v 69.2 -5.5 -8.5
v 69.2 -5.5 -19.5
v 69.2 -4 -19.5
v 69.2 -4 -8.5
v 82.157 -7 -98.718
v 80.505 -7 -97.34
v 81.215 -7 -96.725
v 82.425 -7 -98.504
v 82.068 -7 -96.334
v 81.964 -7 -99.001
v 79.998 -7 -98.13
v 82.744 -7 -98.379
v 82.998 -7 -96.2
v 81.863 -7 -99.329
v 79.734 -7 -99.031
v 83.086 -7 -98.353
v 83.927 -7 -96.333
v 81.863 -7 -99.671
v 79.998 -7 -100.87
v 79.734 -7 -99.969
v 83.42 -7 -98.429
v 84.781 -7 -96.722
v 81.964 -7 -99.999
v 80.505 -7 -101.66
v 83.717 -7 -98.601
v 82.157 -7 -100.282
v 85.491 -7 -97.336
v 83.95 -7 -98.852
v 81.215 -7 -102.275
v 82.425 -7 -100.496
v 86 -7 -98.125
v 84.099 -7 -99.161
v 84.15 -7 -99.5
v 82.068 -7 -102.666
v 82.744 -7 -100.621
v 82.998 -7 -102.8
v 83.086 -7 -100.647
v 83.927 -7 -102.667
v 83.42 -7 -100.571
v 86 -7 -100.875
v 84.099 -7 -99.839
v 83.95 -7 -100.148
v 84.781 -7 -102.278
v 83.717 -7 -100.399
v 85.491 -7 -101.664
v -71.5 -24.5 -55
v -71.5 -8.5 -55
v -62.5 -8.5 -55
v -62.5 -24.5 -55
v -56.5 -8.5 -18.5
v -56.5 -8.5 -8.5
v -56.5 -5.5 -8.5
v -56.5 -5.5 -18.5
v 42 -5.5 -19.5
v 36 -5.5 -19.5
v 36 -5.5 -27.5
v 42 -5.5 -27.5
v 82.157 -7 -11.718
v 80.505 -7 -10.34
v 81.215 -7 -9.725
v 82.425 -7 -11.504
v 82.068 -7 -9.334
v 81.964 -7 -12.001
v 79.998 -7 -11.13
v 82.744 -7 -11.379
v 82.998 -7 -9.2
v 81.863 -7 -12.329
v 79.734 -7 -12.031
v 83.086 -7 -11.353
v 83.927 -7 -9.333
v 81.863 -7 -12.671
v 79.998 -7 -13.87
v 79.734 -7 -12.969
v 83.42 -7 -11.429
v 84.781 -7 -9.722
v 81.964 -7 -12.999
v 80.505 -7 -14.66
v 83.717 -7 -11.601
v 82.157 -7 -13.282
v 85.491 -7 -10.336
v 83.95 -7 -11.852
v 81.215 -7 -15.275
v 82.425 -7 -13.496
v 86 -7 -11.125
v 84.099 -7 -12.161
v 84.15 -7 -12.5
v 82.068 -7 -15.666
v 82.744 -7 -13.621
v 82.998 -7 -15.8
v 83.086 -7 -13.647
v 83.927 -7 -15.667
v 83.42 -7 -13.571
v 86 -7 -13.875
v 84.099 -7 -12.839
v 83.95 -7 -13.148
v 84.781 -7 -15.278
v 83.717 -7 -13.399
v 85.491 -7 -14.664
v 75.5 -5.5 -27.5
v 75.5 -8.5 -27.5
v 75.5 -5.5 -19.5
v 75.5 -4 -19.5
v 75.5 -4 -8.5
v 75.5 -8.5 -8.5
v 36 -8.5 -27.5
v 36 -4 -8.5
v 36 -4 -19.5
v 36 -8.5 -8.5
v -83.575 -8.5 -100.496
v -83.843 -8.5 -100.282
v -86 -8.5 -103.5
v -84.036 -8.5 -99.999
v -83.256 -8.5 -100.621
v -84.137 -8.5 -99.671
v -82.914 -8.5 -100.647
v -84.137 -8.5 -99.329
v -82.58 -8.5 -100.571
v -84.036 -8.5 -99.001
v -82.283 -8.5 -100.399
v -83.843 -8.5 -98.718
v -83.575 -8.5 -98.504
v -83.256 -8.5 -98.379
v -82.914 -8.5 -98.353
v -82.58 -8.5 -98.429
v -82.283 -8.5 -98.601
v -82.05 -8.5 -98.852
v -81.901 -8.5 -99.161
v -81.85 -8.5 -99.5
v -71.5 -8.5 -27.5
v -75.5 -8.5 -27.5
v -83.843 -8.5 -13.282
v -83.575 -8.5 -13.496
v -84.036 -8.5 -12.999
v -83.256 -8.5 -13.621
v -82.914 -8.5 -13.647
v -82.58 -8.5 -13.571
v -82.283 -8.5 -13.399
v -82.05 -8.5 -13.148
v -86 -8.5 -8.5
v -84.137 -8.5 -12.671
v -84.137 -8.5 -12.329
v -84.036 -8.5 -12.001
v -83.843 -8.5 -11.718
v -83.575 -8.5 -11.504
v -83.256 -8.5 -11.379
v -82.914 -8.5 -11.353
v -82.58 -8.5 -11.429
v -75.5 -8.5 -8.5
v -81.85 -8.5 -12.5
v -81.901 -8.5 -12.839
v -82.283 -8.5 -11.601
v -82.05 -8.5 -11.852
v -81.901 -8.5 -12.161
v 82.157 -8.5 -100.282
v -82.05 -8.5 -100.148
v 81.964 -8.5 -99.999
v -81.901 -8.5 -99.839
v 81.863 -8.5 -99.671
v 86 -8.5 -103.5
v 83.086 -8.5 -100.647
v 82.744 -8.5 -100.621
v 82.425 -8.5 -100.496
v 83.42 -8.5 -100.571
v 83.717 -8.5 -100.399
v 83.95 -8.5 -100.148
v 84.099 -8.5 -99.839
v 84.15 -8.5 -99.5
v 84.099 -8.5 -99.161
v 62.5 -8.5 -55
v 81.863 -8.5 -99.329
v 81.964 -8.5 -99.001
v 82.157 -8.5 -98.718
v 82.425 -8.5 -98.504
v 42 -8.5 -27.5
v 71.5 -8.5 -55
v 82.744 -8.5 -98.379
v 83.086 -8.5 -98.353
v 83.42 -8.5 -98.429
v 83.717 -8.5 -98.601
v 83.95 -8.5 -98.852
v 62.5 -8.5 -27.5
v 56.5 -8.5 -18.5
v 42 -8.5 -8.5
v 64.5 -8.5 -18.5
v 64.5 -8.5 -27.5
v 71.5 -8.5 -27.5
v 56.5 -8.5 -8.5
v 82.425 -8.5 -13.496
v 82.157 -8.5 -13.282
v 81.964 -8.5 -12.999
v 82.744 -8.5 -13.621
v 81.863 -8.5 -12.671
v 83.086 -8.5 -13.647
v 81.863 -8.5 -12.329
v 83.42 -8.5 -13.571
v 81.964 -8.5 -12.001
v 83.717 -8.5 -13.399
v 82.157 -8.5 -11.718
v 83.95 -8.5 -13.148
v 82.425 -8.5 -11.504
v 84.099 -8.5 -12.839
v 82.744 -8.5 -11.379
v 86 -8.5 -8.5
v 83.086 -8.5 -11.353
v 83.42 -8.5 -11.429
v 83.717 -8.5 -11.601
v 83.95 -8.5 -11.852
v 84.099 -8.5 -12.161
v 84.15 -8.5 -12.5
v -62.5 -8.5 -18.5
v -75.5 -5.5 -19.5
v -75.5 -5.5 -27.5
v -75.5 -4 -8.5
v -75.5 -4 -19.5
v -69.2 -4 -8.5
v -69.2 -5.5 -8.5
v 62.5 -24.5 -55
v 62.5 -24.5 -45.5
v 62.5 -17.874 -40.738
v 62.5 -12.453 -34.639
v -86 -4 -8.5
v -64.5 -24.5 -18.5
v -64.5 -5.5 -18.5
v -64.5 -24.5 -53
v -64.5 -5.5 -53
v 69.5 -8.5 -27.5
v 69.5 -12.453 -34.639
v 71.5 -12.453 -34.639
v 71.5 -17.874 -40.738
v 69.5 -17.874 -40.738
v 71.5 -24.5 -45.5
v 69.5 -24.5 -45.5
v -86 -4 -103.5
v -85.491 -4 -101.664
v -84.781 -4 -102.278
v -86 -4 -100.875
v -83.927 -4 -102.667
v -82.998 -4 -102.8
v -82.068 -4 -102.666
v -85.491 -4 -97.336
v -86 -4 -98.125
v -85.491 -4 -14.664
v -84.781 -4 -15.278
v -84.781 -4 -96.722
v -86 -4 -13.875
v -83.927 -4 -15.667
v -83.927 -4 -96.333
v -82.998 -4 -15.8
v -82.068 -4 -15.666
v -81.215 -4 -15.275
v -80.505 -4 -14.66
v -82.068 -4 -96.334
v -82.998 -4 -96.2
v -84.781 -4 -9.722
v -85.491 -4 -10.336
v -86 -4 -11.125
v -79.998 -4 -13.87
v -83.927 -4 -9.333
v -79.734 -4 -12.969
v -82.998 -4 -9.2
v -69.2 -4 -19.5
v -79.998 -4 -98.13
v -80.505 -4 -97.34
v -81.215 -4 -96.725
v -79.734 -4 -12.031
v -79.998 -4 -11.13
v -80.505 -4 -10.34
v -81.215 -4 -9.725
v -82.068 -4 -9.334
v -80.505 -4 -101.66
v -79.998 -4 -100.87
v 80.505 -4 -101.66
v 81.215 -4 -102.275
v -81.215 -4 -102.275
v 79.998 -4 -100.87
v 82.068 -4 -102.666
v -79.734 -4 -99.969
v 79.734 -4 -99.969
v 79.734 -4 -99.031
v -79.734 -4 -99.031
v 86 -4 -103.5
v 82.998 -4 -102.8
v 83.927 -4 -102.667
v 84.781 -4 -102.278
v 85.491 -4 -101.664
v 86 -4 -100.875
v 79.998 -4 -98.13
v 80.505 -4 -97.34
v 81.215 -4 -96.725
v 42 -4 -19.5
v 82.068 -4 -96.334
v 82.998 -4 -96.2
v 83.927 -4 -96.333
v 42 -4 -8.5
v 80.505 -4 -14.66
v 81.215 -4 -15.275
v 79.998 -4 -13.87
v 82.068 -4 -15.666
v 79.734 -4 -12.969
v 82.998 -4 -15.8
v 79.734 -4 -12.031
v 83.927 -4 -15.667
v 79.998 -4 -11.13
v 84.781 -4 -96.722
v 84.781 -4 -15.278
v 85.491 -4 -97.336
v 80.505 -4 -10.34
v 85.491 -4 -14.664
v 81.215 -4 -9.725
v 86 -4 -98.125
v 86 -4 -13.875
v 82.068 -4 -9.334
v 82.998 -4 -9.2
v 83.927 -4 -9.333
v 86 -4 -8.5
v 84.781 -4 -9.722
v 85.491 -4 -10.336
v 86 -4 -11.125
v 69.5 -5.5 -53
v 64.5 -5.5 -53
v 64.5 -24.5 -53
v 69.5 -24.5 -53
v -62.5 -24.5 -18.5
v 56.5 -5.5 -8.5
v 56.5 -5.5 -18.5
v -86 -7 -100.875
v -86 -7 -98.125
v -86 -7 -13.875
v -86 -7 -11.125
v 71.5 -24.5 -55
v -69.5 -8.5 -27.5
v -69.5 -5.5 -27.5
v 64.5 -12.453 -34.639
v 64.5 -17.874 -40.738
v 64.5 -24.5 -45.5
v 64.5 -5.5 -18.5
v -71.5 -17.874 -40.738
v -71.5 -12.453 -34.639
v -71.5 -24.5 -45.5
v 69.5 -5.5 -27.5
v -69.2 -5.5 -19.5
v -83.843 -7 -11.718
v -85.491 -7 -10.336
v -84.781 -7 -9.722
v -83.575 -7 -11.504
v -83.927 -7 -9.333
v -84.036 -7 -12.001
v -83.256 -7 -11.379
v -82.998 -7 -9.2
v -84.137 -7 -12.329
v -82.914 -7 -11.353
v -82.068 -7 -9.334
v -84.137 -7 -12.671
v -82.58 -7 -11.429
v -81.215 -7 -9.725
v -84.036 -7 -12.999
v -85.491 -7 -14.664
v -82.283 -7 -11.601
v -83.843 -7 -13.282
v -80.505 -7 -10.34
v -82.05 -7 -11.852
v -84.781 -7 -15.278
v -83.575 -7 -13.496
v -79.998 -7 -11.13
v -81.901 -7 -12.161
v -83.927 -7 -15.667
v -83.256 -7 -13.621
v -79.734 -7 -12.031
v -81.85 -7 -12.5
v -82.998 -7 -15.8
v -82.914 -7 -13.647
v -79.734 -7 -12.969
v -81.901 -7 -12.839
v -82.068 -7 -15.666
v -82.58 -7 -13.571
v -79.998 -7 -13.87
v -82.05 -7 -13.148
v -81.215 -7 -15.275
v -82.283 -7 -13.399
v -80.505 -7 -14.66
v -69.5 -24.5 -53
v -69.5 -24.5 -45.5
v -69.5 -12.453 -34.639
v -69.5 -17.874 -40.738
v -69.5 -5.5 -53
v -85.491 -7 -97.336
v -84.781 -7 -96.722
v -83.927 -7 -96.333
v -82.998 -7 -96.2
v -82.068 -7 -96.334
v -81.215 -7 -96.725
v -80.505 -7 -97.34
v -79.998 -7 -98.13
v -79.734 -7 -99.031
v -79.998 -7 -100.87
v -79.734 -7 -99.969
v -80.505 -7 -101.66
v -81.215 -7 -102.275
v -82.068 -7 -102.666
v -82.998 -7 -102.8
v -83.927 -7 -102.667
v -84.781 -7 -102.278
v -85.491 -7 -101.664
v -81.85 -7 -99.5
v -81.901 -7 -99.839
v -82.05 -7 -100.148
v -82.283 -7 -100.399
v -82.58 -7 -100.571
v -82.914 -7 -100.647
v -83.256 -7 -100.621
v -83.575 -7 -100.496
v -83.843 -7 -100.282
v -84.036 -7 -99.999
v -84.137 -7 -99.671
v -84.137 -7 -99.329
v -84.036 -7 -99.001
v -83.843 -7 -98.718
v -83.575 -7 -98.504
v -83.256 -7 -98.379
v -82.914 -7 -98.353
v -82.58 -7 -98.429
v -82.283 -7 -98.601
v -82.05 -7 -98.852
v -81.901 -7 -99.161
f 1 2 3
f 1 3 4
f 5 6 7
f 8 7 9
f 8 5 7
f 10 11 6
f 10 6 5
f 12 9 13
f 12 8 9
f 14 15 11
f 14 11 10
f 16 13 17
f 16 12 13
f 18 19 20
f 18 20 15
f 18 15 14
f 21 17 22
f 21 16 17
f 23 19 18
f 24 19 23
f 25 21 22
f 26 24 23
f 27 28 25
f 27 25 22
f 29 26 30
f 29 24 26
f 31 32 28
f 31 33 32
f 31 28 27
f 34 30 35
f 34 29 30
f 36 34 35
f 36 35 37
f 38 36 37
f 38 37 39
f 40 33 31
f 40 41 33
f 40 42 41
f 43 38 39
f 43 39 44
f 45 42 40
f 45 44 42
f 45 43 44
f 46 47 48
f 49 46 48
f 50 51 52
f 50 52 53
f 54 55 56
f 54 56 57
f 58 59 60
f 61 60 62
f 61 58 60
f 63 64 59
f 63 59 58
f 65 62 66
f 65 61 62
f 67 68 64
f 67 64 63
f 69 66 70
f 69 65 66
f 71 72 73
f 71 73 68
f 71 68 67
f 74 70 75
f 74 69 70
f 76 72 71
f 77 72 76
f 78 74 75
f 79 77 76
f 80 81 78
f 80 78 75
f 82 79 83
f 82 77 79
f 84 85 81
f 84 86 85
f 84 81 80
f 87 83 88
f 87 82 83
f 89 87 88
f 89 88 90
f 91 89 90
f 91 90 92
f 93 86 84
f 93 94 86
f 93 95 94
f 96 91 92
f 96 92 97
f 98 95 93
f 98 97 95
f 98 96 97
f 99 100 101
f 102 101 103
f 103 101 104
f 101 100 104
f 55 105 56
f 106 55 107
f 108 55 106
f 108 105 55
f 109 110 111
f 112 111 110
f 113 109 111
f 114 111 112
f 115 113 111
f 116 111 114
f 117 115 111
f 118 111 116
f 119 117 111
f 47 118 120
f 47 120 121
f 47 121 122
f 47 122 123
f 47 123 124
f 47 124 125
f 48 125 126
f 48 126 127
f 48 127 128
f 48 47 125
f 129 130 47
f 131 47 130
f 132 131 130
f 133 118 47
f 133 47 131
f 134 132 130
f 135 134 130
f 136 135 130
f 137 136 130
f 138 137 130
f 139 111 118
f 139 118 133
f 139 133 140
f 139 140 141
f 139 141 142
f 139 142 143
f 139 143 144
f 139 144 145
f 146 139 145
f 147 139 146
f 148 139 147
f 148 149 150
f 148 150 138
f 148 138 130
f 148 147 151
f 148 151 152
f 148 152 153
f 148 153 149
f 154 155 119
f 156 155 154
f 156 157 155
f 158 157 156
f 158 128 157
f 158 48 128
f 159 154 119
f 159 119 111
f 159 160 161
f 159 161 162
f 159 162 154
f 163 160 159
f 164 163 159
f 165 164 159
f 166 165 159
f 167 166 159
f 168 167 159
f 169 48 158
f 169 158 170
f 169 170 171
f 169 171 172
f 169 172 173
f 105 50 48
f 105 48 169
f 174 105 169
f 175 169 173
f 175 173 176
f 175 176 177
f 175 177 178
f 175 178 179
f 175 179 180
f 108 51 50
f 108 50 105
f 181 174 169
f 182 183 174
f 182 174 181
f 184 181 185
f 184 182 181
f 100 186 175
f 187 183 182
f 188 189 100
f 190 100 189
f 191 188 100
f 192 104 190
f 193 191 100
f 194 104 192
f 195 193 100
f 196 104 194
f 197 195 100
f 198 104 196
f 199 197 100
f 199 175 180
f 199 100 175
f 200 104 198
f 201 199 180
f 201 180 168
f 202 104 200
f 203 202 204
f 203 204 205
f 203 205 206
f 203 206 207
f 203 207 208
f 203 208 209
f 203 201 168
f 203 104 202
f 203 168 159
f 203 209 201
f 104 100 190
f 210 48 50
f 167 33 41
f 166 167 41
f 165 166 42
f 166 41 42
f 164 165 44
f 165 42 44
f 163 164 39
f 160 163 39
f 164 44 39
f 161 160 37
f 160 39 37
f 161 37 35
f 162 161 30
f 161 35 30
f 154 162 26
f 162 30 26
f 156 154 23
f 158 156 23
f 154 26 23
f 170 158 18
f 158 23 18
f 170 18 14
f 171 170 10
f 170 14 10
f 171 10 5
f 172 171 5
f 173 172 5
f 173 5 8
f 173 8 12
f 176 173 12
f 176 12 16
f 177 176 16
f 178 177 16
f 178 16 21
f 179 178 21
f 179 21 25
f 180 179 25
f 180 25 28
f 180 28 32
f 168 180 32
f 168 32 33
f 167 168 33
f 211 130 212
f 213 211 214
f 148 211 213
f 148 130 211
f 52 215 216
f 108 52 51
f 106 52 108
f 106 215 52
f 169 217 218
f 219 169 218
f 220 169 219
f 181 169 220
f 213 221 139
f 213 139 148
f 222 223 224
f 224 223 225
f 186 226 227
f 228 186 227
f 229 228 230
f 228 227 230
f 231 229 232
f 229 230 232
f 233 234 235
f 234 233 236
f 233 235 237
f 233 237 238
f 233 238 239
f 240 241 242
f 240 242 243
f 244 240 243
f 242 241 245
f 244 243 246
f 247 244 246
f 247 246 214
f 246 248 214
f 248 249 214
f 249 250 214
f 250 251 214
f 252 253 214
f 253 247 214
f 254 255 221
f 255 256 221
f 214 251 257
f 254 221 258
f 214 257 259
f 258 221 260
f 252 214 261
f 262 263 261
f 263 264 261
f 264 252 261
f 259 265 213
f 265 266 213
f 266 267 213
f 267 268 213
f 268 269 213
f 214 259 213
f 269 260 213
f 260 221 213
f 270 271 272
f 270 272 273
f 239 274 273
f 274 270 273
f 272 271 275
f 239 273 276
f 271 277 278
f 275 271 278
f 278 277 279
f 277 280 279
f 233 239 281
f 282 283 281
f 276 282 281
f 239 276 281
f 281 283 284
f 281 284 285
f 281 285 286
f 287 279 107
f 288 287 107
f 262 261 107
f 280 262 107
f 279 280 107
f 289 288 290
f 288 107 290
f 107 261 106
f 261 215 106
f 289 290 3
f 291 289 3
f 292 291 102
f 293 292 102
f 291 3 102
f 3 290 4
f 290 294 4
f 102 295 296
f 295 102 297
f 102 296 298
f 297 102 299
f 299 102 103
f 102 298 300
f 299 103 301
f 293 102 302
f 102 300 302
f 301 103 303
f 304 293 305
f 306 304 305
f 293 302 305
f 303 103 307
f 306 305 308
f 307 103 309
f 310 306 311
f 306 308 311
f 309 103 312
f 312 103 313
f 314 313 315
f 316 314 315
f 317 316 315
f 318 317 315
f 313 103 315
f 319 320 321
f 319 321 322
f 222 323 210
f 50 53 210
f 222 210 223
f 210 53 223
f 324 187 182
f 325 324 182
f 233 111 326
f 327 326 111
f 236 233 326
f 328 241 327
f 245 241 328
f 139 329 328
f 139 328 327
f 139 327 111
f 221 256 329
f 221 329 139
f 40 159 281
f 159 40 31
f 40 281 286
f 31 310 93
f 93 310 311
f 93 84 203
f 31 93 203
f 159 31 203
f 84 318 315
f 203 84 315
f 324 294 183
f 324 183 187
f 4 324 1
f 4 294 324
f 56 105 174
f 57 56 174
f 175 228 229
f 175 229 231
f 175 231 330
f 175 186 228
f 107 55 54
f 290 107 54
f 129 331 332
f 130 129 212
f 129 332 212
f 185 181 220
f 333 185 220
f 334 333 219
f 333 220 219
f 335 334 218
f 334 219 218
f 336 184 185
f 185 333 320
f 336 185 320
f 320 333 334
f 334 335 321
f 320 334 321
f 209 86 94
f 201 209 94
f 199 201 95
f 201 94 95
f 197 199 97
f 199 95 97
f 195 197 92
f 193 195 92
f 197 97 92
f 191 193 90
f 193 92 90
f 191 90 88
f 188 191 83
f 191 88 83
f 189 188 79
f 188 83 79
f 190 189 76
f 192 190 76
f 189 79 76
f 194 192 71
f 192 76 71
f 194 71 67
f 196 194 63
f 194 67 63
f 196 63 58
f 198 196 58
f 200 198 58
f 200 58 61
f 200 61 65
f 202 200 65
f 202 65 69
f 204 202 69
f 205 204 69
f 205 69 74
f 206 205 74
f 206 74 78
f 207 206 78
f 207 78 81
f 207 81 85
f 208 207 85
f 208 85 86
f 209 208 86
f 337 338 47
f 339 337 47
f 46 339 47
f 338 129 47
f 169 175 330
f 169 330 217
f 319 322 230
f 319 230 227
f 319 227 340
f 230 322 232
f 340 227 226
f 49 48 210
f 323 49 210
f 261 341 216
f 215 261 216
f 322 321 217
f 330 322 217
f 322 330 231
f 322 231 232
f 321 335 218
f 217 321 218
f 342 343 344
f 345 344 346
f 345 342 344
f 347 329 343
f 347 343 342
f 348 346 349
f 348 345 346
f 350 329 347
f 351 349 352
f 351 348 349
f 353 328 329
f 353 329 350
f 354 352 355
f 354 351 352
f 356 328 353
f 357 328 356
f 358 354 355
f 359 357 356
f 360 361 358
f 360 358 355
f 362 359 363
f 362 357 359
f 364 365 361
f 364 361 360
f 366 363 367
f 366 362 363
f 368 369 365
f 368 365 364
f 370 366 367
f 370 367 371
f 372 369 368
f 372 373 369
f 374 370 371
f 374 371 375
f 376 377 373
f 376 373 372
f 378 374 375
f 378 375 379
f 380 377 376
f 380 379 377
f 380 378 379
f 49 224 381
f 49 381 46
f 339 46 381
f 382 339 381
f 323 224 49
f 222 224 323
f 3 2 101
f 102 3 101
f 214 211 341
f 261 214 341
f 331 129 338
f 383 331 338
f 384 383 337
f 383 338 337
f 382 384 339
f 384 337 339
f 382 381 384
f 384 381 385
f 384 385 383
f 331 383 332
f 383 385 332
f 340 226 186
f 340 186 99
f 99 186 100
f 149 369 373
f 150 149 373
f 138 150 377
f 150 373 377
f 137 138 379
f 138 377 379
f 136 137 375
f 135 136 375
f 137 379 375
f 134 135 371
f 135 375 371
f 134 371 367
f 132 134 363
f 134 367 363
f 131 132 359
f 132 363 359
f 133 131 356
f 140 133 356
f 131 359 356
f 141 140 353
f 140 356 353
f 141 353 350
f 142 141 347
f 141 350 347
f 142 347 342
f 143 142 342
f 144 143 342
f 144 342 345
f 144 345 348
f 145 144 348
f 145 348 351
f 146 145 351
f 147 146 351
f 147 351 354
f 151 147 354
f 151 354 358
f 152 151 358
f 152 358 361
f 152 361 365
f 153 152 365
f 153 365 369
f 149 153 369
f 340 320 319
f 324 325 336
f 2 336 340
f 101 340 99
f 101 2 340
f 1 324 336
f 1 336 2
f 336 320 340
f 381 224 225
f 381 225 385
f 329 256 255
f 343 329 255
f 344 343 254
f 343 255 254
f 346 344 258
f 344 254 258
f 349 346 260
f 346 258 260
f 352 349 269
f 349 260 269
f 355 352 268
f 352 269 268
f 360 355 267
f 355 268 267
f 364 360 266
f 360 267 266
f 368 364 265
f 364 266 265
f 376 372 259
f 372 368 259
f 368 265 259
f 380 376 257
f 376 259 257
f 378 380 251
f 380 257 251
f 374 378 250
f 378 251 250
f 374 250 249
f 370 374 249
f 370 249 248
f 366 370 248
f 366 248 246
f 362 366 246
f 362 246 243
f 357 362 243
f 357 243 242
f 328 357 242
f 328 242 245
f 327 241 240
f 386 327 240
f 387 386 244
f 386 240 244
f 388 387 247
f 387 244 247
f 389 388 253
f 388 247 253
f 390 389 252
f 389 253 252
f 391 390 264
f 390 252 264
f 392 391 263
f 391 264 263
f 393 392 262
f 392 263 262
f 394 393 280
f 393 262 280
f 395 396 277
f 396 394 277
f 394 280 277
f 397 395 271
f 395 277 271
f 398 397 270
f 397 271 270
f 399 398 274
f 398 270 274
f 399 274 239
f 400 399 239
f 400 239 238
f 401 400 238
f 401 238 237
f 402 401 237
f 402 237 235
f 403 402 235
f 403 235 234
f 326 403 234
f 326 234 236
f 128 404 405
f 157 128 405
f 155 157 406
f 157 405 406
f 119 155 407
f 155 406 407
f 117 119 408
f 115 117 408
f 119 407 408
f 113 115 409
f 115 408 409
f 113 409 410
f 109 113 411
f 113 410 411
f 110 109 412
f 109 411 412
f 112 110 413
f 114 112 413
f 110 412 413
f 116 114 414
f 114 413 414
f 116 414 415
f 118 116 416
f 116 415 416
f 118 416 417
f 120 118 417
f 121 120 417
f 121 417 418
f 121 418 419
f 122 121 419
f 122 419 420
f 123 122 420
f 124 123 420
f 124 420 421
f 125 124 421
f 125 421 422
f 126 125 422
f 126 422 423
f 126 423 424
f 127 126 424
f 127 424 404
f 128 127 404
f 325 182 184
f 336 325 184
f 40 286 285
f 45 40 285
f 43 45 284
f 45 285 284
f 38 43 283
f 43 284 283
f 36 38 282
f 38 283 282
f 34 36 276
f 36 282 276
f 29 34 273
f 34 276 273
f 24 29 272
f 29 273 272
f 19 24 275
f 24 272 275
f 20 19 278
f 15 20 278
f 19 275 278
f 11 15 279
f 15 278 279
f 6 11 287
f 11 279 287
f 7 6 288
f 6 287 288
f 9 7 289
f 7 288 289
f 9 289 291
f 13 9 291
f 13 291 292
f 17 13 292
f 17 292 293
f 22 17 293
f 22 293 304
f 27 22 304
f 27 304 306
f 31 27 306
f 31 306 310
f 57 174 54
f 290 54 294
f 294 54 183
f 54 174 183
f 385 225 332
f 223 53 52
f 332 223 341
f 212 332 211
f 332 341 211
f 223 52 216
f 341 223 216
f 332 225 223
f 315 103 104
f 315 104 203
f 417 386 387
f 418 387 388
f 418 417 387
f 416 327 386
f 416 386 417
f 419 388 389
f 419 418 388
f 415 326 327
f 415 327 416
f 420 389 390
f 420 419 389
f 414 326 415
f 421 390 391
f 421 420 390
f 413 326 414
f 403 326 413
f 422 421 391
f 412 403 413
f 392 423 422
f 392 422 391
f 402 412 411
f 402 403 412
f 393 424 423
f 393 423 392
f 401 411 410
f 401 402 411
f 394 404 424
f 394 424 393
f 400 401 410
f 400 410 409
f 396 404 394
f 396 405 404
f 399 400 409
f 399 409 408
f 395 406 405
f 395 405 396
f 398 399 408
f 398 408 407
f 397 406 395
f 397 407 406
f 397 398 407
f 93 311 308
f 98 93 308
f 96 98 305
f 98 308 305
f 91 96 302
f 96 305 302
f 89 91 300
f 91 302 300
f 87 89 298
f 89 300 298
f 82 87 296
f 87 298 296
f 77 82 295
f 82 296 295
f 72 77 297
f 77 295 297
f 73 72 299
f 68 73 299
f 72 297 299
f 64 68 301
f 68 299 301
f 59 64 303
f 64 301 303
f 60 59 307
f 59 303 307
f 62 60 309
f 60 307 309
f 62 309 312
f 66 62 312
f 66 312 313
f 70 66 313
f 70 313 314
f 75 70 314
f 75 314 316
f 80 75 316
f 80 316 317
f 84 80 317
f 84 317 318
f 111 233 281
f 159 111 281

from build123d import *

# Parameters (mm, degrees)
SKETCH097_W     = 172
SKETCH097_H     = 95
PAD059_DEPTH    = 4.5
SKETCH098_W     = 6
SKETCH098_H     = 19
POCKET036_DEPTH = 3
SKETCH099_W     = 6.3
SKETCH099_H     = 11
SKETCH099_W_2   = 6
POCKET037_DEPTH = 5
PAD060_DEPTH    = 16
POCKET038_DEPTH = 5
POCKET039_DEPTH = 9
SKETCH103_R     = 1.15
POCKET040_DEPTH = 5
SKETCH104_R     = 3.3
POCKET041_DEPTH = 3


with BuildPart() as part:
    # Sketch097 → Pad059 (new body)
    with BuildSketch(Plane.XZ):
        Rectangle(SKETCH097_W, SKETCH097_H)
    extrude(amount=PAD059_DEPTH)

    # Sketch098 (on Face6 of Pad059) → Pocket036 (cut)
    with BuildSketch(Plane.XZ.offset(4.5)):
        Polygon((64.5, 3), (69.5, 3), (69.5, 28.5), (75.5, 28.5), (75.5, 47.5), (56.5, 47.5), (56.5, 37.5), (64.5, 37.5), align=None)
        with Locations((39, 38)):
            Rectangle(SKETCH098_W, SKETCH098_H)
        Polygon((-64.5, 3), (-69.5, 3), (-69.5, 28.5), (-75.5, 28.5), (-75.5, 47.5), (-56.5, 47.5), (-56.5, 37.5), (-64.5, 37.5), align=None)
    extrude(amount=-POCKET036_DEPTH, mode=Mode.SUBTRACT)

    # Sketch099 (on Face26 of Pocket036) → Pocket037 (cut)
    with BuildSketch(Plane.XZ.offset(1.5)):
        with Locations((72.35, 42)):
            Rectangle(SKETCH099_W, SKETCH099_H)
        with Locations((39, 42)):
            Rectangle(SKETCH099_W_2, SKETCH099_H)
        with Locations((-72.35, 42)):
            Rectangle(SKETCH099_W, SKETCH099_H)
    extrude(amount=-POCKET037_DEPTH, mode=Mode.SUBTRACT)

    # Sketch100 (on Face5 of Pocket037) → Pad060 (join)
    with BuildSketch(Plane.XZ.offset(4.5)):
        Polygon((-69.5, 28.5), (-71.5, 28.5), (-71.5, 1), (-62.5, 1), (-62.5, 37.5), (-64.5, 37.5), (-64.5, 3), (-69.5, 3), align=None)
        Polygon((64.5, 37.5), (64.5, 3), (69.5, 3), (69.5, 28.5), (71.5, 28.5), (71.5, 1), (62.5, 1), (62.5, 37.5), align=None)
    extrude(amount=PAD060_DEPTH)

    # Sketch101 (on Face27 of Pad060) → Pocket038 (cut)
    with BuildSketch(Plane(origin=(-71.5, 0, 0), x_dir=(0, 0, -1), z_dir=(-1, 0, 0))):
        with BuildLine():
            ThreePointArc((-28.5, 4.5), (-18.161779, 10.994502), (-10.5, 20.5))
            Line((-28.5, 20.5), (-10.5, 20.5))
            Line((-28.5, 4.5), (-28.5, 20.5))
        make_face()
    extrude(amount=-POCKET038_DEPTH, mode=Mode.SUBTRACT)

    # Sketch102 (on Face22 of Pocket038) → Pocket039 (cut)
    with BuildSketch(Plane(origin=(62.5, 0, 0), x_dir=(0, 0, -1), z_dir=(-1, 0, 0))):
        with BuildLine():
            Line((-37.5, 20.5), (-10.5, 20.5))
            ThreePointArc((-28.5, 4.5), (-18.161779, 10.994501), (-10.5, 20.5))
            Line((-37.5, 4.5), (-28.5, 4.5))
            Line((-37.5, 20.5), (-37.5, 4.5))
        make_face()
    extrude(amount=-POCKET039_DEPTH, mode=Mode.SUBTRACT)

    # Sketch103 (on Face4 of Pocket039) → Pocket040 (cut)
    with BuildSketch(Plane(origin=(0, 0, 0), x_dir=(1, 0, 0), z_dir=(0, 1, 0))):
        with Locations((-83, 43.5)):
            Circle(SKETCH103_R)
        with Locations((83, 43.5)):
            Circle(SKETCH103_R)
        with Locations((83, -43.5)):
            Circle(SKETCH103_R)
        with Locations((-83, -43.5)):
            Circle(SKETCH103_R)
    extrude(amount=-POCKET040_DEPTH, mode=Mode.SUBTRACT)

    # Sketch104 (on Face4 of Pocket040) → Pocket041 (cut)
    with BuildSketch(Plane(origin=(0, 0, 0), x_dir=(1, 0, 0), z_dir=(0, 1, 0))):
        with Locations((83, 43.5)):
            Circle(SKETCH104_R)
        with Locations((83, -43.5)):
            Circle(SKETCH104_R)
        with Locations((-83, -43.5)):
            Circle(SKETCH104_R)
        with Locations((-83, 43.5)):
            Circle(SKETCH104_R)
    extrude(amount=-POCKET041_DEPTH, mode=Mode.SUBTRACT)


with BuildPart() as part_1:
    # Body021 placement: moved
    add(part.part.moved(Location((0, -4, -56))))


solid = part_1.part
